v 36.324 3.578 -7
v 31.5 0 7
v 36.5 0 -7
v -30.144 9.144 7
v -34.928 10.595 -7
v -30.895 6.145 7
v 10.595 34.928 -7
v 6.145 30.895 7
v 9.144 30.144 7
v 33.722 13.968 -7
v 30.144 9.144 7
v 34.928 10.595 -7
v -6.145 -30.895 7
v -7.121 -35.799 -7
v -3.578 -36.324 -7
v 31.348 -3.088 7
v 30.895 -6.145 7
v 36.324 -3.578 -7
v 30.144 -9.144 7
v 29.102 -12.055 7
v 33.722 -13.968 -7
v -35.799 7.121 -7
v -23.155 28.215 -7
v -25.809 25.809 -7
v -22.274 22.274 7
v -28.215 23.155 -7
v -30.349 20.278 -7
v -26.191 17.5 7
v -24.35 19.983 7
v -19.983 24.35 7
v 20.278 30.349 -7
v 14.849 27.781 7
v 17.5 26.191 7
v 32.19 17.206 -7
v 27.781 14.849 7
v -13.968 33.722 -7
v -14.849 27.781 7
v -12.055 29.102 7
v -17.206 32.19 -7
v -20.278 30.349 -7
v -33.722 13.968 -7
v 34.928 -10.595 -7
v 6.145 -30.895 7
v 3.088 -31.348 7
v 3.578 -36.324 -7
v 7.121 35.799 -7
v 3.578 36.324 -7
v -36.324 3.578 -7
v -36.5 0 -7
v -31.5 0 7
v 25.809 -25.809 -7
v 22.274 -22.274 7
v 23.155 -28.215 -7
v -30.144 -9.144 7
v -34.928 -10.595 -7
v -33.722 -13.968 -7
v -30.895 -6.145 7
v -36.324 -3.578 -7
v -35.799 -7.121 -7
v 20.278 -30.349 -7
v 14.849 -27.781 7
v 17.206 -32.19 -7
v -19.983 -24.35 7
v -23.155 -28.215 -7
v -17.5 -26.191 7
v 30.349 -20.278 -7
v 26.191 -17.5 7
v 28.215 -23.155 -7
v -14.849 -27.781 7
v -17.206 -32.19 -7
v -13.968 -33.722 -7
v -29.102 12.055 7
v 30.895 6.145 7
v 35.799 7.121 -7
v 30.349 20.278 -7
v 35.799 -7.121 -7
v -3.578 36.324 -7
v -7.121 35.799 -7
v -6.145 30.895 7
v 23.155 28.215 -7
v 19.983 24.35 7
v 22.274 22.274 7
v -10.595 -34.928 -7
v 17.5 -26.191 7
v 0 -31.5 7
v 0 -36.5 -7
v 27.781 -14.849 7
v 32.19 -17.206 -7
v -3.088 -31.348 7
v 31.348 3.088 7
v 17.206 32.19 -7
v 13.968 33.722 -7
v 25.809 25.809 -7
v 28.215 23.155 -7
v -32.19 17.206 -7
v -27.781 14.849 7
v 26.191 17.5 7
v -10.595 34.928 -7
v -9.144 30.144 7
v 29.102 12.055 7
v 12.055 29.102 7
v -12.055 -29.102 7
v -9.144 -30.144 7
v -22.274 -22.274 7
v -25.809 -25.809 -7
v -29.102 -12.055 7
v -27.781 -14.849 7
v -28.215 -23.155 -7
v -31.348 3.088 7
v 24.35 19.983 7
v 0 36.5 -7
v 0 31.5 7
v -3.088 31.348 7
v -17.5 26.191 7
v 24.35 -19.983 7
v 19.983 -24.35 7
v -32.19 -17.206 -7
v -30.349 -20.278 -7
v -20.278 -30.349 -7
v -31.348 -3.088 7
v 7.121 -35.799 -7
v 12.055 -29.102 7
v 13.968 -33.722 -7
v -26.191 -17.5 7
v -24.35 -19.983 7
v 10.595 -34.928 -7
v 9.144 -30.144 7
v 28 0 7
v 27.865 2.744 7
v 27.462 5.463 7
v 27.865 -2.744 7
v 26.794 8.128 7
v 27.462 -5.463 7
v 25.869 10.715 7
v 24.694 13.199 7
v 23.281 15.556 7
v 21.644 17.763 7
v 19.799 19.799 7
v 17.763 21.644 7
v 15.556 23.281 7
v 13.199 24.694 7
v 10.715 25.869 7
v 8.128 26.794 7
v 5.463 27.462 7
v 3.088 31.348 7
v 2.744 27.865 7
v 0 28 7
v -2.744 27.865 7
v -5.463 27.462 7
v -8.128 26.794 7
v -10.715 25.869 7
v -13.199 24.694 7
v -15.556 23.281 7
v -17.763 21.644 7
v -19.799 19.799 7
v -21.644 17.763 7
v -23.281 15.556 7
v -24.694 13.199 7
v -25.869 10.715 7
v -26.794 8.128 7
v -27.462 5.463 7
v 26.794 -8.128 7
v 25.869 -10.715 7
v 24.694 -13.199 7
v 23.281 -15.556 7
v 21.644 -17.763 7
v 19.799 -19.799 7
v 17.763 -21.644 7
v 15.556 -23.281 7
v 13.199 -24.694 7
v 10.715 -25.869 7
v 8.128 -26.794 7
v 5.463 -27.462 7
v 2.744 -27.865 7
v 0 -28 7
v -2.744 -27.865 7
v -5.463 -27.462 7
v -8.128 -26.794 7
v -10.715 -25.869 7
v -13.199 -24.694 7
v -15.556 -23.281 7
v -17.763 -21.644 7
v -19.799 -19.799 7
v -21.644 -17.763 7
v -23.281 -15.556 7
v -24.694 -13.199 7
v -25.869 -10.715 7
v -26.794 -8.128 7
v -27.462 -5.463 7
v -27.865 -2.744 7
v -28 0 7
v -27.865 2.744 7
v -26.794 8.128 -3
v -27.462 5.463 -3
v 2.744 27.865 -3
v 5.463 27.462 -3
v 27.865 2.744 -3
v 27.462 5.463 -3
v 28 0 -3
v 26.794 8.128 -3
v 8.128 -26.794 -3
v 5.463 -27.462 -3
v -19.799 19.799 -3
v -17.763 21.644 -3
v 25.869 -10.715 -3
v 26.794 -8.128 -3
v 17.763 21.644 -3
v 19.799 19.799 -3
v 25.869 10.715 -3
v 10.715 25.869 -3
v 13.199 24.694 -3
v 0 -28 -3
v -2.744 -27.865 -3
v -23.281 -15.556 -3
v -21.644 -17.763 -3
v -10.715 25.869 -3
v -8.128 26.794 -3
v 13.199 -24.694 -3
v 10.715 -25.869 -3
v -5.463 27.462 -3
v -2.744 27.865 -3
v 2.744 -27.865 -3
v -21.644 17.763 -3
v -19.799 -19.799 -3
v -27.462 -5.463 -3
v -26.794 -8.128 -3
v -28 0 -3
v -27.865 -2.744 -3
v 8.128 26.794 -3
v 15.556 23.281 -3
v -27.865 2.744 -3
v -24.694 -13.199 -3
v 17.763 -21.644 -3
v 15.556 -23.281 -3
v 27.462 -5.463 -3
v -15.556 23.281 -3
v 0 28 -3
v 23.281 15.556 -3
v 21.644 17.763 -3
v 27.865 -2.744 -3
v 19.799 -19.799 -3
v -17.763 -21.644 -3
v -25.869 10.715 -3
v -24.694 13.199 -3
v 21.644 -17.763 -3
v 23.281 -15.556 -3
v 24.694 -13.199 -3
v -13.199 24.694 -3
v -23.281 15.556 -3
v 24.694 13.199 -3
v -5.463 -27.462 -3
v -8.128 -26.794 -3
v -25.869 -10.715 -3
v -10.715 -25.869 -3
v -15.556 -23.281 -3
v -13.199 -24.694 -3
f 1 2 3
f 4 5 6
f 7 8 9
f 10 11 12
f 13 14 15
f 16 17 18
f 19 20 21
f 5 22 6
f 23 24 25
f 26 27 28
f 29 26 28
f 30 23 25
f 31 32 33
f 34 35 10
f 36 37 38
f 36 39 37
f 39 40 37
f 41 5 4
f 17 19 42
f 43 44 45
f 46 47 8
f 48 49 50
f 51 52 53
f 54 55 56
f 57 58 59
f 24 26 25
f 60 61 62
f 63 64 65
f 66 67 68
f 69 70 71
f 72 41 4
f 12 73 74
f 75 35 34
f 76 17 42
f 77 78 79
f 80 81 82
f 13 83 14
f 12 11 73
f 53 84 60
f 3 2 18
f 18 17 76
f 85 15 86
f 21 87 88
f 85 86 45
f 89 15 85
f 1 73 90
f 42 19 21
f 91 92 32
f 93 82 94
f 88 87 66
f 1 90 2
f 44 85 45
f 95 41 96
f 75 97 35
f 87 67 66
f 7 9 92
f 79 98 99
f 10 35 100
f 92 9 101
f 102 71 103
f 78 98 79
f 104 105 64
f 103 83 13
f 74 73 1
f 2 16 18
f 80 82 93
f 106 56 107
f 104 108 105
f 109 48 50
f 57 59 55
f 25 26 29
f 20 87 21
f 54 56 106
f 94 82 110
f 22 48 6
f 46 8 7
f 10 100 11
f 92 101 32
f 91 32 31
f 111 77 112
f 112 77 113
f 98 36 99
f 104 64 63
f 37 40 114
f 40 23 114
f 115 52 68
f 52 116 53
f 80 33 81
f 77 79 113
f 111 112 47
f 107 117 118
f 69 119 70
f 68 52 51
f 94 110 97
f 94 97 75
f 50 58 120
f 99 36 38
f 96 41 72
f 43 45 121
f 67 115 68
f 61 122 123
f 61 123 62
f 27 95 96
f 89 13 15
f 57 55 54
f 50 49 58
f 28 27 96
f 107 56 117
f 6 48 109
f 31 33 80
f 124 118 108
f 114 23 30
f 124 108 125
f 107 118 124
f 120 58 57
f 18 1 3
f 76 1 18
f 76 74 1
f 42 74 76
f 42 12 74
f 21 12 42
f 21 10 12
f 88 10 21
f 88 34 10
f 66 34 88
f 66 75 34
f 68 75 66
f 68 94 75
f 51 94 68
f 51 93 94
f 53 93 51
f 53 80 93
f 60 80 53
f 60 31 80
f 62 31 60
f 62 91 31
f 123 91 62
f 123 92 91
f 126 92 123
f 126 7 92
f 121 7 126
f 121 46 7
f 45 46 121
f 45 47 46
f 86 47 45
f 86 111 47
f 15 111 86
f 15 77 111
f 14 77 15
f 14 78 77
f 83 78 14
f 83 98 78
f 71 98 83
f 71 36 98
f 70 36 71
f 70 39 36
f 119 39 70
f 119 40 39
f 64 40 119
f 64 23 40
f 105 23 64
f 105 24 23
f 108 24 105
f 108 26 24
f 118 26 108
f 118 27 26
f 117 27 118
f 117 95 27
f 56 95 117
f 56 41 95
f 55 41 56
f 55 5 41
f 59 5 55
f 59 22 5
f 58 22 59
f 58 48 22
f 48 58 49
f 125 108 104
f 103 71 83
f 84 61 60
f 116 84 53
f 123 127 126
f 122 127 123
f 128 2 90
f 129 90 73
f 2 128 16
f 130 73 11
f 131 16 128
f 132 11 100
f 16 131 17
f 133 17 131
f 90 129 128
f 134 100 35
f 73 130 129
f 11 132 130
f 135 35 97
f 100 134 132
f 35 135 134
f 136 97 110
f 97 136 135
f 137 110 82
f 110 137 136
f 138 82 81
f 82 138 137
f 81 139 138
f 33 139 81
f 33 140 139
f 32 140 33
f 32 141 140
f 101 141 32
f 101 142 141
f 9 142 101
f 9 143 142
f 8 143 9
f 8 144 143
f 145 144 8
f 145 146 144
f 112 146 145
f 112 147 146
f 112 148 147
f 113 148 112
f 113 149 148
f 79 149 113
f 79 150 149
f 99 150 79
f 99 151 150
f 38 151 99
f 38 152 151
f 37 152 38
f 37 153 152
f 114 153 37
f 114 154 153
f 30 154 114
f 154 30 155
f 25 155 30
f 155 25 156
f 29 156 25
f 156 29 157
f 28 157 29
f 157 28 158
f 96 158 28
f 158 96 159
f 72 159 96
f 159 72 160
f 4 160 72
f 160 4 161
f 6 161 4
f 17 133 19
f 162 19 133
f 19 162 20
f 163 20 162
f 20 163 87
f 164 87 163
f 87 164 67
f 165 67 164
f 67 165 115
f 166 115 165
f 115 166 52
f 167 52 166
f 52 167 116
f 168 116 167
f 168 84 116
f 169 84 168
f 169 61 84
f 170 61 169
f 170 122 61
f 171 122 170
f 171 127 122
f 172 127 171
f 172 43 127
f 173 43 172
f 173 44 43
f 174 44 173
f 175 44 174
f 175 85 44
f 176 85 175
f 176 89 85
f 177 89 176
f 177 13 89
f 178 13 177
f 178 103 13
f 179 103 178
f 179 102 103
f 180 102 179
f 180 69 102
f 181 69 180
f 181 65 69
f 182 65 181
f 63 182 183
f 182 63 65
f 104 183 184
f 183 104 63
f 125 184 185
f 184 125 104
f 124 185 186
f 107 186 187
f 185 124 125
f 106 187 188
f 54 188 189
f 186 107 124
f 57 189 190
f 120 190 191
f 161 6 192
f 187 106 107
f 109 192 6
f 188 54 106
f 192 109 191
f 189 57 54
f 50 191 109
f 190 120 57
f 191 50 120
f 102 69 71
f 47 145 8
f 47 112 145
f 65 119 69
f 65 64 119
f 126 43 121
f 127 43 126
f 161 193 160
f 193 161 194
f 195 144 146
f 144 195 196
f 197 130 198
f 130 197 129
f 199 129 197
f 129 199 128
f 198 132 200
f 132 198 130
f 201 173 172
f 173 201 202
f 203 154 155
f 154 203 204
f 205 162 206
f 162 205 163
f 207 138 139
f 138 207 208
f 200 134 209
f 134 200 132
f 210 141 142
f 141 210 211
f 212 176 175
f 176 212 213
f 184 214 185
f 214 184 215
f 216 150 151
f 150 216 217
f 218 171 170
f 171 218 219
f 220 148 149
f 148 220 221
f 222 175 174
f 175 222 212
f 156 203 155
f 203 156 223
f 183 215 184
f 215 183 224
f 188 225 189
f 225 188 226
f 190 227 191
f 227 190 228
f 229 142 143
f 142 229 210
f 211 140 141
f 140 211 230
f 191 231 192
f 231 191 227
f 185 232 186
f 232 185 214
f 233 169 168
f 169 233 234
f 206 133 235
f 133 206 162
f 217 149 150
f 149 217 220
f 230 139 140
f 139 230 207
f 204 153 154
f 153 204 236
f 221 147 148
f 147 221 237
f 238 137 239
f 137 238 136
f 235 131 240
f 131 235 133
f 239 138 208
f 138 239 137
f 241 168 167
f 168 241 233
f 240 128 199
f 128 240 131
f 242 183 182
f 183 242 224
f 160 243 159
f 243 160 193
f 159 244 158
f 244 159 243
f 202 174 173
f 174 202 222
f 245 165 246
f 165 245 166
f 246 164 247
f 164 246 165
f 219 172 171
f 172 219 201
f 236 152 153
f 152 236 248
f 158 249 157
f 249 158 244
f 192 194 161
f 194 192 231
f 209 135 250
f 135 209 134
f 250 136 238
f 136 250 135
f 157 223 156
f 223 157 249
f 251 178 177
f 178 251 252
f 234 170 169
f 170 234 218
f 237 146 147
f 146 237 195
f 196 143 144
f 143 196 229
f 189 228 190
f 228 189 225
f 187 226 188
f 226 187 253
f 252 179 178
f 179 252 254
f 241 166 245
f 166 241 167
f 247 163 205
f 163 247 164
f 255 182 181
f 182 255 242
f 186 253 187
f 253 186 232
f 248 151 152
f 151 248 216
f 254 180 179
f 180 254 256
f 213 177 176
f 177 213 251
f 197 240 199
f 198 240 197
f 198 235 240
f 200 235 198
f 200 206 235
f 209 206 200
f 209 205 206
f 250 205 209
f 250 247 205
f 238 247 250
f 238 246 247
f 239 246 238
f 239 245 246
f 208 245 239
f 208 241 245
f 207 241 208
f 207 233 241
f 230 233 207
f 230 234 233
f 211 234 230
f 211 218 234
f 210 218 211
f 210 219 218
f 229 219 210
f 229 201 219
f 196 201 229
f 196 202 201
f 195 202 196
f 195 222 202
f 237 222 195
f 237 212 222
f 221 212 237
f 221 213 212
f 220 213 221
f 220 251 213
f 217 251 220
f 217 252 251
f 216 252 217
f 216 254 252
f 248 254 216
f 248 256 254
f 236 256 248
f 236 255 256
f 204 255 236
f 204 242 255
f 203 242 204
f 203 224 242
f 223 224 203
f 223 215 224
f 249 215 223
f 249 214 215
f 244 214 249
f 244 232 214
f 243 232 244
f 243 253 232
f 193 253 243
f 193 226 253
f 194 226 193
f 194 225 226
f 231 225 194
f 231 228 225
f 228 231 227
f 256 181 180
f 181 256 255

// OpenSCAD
/**
 ** Title: coaster for pepper mill
 ** Author: Angel3D
 ** Date: 17.03.2019
 ** thingiverse url: https://www.thingiverse.com/thing:3500233
 **/
 
// define variables section
COASTER_ROUDNESS=64;             // perfection of a round object (32 = nice roundness)
COASTER_INNER_DIAMETER=55;       // inner diameter of coaster
COASTER_WALL_THICKNESS=4;        // thickness of coaster wall
COASTER_BOTTOM_THICKNESS=4;      // thickness of bottom
COASTER_OUTTER_DIAMETER_DIFF=10; // outter diameter of the base bottom part
                                 // values >0 let the base become a cone  
COASTER_WALL_HEIGTH=10;          // height of the walls, starting from top of base part     
ROUND_EDGES_THICKNESS=1;         // define thickness of round edges (ENABLE_ROUND_EDGES must be set to true to enable)
ENABLE_ROUND_EDGES=false;        // enalble or desable round edges
 
// display section
if (ENABLE_ROUND_EDGES) {
  minkowski(){
    coaster();
    sphere(ROUND_EDGES_THICKNESS);
  }
}
else {
  coaster();
}


// modules section
module coaster(){
  difference(){
    coasterBase();
    translate([0,0,COASTER_BOTTOM_THICKNESS/2]){
      coasterInner();   
    }
  }
}

module coasterInner() {
  cylinder(COASTER_WALL_HEIGTH,d=COASTER_INNER_DIAMETER+ROUND_EDGES_THICKNESS,center=true, $fn=COASTER_ROUDNESS);
}

module coasterBase(){
  cylinder(COASTER_BOTTOM_THICKNESS+COASTER_WALL_HEIGTH,d1=COASTER_INNER_DIAMETER+COASTER_OUTTER_DIAMETER_DIFF+(COASTER_WALL_THICKNESS*2),d2=COASTER_INNER_DIAMETER+(COASTER_WALL_THICKNESS*2),center=true, $fn=COASTER_ROUDNESS);
}
